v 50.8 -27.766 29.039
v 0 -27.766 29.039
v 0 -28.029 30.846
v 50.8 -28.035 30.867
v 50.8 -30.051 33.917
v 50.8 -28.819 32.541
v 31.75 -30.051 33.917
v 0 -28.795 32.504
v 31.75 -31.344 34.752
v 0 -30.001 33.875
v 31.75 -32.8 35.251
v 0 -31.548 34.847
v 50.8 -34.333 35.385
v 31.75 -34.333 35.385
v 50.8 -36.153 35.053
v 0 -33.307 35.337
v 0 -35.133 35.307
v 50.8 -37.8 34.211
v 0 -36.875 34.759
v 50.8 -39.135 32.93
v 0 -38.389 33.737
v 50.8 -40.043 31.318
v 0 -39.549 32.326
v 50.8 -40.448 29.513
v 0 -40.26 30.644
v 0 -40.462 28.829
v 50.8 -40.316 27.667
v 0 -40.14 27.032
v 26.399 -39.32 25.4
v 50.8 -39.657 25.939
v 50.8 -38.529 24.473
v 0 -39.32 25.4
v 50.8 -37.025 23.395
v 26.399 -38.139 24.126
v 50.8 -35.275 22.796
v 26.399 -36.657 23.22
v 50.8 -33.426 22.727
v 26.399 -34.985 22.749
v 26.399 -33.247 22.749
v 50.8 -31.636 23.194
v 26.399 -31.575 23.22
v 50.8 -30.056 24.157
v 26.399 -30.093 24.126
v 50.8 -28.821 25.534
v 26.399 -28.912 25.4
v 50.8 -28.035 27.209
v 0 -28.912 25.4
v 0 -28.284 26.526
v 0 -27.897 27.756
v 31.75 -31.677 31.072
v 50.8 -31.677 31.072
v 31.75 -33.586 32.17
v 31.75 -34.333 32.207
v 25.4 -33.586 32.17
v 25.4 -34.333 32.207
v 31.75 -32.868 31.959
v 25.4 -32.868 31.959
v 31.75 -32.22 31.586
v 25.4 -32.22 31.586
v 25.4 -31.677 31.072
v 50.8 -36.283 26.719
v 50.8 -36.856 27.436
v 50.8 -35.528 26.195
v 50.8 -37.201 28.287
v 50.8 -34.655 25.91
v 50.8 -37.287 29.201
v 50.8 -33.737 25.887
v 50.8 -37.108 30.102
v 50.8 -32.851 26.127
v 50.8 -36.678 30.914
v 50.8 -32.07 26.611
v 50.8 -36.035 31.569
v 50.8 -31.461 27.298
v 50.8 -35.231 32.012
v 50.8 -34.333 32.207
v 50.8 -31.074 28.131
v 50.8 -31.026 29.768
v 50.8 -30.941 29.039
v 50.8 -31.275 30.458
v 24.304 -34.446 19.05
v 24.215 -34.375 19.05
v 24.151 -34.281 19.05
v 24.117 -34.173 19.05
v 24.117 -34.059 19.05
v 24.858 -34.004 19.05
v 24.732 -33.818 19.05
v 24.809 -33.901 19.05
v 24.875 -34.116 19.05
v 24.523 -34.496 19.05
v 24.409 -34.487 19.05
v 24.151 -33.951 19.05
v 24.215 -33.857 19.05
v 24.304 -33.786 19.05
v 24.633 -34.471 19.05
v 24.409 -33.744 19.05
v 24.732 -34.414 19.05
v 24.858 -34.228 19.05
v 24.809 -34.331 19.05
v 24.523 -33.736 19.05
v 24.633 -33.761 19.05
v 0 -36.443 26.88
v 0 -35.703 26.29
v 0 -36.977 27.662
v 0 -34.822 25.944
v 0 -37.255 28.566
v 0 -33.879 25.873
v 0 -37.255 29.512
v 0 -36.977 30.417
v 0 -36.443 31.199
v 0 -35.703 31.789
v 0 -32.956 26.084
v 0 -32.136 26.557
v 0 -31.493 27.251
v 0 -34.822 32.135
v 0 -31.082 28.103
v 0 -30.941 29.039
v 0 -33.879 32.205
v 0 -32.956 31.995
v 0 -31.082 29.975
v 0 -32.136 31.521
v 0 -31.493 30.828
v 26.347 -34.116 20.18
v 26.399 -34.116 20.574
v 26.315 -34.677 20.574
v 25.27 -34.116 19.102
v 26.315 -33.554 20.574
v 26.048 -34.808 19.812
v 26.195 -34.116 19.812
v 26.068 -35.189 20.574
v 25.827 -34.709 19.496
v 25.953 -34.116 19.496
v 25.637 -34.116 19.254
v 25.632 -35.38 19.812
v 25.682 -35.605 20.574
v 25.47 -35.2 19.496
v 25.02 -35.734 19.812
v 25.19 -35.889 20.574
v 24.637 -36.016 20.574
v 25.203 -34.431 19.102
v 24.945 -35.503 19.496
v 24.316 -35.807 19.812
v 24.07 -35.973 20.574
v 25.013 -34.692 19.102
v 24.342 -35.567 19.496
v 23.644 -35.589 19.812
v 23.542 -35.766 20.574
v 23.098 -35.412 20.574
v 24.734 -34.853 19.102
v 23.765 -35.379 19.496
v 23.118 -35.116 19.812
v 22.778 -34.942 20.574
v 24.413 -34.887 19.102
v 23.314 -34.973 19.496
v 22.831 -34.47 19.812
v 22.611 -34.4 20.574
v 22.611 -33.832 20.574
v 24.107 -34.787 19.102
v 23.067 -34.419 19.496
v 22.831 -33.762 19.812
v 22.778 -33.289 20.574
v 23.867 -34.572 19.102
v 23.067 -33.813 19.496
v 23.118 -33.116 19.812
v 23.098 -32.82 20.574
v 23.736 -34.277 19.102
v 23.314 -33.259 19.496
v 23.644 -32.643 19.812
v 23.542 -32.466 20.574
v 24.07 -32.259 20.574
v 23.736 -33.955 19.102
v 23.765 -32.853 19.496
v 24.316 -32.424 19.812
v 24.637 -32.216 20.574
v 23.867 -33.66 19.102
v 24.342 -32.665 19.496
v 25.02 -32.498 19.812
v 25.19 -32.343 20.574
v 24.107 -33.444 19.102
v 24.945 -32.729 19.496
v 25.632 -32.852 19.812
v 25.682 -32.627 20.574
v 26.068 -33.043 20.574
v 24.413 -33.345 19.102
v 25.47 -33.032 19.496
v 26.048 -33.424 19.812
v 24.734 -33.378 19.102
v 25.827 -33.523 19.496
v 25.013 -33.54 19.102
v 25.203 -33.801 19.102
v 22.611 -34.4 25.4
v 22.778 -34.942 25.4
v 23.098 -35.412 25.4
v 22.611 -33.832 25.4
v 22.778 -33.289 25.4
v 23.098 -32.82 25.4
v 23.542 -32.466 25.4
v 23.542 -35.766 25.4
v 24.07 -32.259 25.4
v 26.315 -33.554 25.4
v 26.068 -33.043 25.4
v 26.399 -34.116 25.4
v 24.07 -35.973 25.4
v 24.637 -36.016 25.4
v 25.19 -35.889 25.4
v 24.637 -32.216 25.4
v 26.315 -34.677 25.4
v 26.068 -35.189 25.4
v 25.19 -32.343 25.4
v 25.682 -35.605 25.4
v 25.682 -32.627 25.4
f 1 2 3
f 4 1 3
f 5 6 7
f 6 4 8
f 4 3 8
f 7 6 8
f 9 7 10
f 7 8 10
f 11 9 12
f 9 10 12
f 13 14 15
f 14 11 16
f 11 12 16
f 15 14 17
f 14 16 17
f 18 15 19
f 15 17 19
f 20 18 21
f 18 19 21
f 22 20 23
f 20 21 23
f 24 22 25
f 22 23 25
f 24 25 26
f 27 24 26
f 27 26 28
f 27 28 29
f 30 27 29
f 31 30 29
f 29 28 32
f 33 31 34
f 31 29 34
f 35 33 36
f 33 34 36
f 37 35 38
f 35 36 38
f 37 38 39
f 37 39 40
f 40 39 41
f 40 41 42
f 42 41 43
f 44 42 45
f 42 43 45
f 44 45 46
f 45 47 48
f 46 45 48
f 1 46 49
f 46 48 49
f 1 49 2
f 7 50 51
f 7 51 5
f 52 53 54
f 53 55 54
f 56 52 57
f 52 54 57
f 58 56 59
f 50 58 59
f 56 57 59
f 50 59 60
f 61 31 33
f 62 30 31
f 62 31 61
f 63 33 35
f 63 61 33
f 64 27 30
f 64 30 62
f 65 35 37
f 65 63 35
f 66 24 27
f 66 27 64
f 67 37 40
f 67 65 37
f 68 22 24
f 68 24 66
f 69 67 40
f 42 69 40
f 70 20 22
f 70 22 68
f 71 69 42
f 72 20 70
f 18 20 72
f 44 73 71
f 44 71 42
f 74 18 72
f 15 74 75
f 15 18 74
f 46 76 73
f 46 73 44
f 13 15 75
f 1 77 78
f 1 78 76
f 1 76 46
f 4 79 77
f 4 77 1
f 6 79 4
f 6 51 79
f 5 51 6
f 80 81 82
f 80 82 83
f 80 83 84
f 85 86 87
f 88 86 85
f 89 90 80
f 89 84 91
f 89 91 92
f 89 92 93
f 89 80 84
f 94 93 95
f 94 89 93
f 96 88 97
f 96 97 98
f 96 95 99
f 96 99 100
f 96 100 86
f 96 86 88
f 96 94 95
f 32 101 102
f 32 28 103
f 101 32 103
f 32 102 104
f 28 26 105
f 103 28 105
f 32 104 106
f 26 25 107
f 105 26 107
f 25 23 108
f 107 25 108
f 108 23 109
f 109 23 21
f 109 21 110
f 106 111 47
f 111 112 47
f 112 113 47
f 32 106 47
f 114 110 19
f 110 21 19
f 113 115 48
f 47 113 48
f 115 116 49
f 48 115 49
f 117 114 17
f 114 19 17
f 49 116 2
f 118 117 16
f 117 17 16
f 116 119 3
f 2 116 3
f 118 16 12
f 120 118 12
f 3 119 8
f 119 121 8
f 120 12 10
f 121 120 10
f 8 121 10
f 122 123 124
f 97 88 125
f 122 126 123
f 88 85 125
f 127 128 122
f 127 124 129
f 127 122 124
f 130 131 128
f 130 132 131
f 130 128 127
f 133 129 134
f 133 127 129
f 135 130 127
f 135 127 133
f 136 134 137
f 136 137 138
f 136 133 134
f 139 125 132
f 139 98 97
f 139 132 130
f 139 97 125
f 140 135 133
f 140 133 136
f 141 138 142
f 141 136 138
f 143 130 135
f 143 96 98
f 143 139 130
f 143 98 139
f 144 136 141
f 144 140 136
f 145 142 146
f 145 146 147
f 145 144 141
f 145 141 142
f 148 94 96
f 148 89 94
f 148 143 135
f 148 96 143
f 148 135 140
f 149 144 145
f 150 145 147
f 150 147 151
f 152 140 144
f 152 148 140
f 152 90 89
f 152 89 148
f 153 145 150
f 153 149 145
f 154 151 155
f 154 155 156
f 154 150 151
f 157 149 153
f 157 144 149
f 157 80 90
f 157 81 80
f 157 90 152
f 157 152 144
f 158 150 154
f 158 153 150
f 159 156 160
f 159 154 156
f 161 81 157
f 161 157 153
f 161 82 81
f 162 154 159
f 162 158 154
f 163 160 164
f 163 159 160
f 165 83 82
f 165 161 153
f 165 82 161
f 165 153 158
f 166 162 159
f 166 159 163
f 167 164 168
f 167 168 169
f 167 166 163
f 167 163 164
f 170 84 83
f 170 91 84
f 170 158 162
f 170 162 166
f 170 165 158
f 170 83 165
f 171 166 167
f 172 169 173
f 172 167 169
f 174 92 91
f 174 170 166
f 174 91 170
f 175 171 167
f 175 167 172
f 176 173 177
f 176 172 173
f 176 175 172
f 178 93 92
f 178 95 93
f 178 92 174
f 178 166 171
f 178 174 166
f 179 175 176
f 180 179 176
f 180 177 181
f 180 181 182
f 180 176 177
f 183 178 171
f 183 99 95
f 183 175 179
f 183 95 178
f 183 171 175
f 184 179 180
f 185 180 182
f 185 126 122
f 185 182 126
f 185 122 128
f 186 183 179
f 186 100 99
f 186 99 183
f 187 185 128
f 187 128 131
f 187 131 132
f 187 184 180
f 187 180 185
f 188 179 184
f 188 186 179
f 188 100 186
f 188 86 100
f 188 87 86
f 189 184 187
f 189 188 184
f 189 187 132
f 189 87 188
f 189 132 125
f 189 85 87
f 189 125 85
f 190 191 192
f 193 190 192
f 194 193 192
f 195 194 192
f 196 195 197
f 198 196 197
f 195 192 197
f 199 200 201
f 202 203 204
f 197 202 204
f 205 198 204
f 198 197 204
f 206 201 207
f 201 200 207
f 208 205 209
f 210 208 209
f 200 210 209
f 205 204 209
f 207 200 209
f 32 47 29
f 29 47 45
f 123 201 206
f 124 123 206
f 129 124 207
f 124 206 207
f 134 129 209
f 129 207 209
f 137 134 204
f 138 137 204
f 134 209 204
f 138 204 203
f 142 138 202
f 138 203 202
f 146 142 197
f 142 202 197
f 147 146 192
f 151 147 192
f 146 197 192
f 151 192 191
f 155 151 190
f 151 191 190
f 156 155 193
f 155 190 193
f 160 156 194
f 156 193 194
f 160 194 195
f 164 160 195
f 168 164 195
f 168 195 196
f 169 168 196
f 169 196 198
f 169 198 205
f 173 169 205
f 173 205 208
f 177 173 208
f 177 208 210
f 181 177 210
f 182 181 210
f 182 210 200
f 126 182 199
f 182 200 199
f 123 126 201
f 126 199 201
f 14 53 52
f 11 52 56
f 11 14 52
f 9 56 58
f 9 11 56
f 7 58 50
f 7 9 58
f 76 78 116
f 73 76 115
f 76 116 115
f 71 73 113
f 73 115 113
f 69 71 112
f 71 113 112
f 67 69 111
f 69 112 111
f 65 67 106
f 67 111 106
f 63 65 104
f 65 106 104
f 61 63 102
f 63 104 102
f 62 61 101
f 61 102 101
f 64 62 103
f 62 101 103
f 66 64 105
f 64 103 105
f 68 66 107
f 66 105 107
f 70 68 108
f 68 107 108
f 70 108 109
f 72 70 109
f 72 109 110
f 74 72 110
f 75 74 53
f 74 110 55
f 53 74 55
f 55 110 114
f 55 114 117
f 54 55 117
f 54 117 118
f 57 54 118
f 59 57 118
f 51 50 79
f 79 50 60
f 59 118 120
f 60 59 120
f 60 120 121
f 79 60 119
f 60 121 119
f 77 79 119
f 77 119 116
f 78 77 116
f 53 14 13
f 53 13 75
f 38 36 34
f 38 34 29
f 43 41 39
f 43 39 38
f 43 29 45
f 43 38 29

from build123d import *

# Parameters (mm, degrees)
F0_R      = 6.35
F1_DEPTH  = 50.8
F2_R      = 3.175
F3_DEPTH  = 50.8
F5_DEPTH  = 25.4
F6_DEPTH  = 6.35
F8_DEPTH  = 25.4
F9_R      = 1.905
F10_DEPTH = 6.35
F11_R     = 1.524


with BuildPart() as f1:
    # F0 (on Right) → F1 (new body)
    with BuildSketch(Plane.YZ):
        with Locations((-34.1159366071, 29.0391650051)):
            Circle(F0_R)
    extrude(amount=F1_DEPTH)

    # F2 (on face) → F3 (cut)
    with BuildSketch(Plane.YZ.offset(50.8)):
        with Locations((-34.1159366071, 29.0391650051)):
            Circle(F2_R)
    extrude(amount=-F3_DEPTH, mode=Mode.SUBTRACT)

    # F4 (on face) → F5 (cut)
    with BuildSketch(Plane.YZ.offset(50.8)):
        with BuildLine():
            Line((-34.3332342946, 35.3854459408), (-34.3332342946, 32.2067203266))
            ThreePointArc((-34.3332342946, 32.2067203266), (-32.8684364804, 31.9588171134), (-31.6767708735, 31.0716746666))
            Line((-31.6767708735, 31.0716746666), (-30.0509194022, 33.9174982372))
            ThreePointArc((-30.0509194022, 33.9174982372), (-32.0568217521, 35.0460399009), (-34.3332342946, 35.3854459408))
        make_face()
    extrude(amount=-F5_DEPTH, mode=Mode.SUBTRACT)

    # F6 (add): a face of the model
    f6_faces = [f1.faces().sort_by_distance(p)[0] for p in [
        (25.4, -32.4787047197, 33.4953797207),
    ]]
    extrude(f6_faces, amount=F6_DEPTH)

    # F7 (on Top) → F8 (cut)
    with BuildSketch(Plane.XY):
        Polygon((26.3992380351, -40.6142137945), (26.3992380351, -26.3992380351), (17.2610413283, -26.1961687356), (17.2610413283, -40.6142137945), align=None)
        Polygon((17.2610413283, -40.6142137945), (17.2610413283, -26.1961687356), (0, -25.8125933232), (0, -40.6142137945), (3.2189439517, -40.6142137945), align=None)
    extrude(amount=F8_DEPTH, mode=Mode.SUBTRACT)


with BuildPart() as f10:
    # F9 (on face) → F10 (new body)
    with BuildSketch(Plane(origin=(0, 0, 25.4), x_dir=(1, 0, 0), z_dir=(0, 0, -1))):
        with Locations((24.4942380351, 34.1159366071)):
            Circle(F9_R)
    extrude(amount=F10_DEPTH)

    # F11
    f11_edges = [f10.edges().sort_by_distance(p)[0] for p in [
        (22.589238, -34.115937, 19.05),
    ]]
    fillet(f11_edges, radius=F11_R)


solid = Compound([f1.part, f10.part])
